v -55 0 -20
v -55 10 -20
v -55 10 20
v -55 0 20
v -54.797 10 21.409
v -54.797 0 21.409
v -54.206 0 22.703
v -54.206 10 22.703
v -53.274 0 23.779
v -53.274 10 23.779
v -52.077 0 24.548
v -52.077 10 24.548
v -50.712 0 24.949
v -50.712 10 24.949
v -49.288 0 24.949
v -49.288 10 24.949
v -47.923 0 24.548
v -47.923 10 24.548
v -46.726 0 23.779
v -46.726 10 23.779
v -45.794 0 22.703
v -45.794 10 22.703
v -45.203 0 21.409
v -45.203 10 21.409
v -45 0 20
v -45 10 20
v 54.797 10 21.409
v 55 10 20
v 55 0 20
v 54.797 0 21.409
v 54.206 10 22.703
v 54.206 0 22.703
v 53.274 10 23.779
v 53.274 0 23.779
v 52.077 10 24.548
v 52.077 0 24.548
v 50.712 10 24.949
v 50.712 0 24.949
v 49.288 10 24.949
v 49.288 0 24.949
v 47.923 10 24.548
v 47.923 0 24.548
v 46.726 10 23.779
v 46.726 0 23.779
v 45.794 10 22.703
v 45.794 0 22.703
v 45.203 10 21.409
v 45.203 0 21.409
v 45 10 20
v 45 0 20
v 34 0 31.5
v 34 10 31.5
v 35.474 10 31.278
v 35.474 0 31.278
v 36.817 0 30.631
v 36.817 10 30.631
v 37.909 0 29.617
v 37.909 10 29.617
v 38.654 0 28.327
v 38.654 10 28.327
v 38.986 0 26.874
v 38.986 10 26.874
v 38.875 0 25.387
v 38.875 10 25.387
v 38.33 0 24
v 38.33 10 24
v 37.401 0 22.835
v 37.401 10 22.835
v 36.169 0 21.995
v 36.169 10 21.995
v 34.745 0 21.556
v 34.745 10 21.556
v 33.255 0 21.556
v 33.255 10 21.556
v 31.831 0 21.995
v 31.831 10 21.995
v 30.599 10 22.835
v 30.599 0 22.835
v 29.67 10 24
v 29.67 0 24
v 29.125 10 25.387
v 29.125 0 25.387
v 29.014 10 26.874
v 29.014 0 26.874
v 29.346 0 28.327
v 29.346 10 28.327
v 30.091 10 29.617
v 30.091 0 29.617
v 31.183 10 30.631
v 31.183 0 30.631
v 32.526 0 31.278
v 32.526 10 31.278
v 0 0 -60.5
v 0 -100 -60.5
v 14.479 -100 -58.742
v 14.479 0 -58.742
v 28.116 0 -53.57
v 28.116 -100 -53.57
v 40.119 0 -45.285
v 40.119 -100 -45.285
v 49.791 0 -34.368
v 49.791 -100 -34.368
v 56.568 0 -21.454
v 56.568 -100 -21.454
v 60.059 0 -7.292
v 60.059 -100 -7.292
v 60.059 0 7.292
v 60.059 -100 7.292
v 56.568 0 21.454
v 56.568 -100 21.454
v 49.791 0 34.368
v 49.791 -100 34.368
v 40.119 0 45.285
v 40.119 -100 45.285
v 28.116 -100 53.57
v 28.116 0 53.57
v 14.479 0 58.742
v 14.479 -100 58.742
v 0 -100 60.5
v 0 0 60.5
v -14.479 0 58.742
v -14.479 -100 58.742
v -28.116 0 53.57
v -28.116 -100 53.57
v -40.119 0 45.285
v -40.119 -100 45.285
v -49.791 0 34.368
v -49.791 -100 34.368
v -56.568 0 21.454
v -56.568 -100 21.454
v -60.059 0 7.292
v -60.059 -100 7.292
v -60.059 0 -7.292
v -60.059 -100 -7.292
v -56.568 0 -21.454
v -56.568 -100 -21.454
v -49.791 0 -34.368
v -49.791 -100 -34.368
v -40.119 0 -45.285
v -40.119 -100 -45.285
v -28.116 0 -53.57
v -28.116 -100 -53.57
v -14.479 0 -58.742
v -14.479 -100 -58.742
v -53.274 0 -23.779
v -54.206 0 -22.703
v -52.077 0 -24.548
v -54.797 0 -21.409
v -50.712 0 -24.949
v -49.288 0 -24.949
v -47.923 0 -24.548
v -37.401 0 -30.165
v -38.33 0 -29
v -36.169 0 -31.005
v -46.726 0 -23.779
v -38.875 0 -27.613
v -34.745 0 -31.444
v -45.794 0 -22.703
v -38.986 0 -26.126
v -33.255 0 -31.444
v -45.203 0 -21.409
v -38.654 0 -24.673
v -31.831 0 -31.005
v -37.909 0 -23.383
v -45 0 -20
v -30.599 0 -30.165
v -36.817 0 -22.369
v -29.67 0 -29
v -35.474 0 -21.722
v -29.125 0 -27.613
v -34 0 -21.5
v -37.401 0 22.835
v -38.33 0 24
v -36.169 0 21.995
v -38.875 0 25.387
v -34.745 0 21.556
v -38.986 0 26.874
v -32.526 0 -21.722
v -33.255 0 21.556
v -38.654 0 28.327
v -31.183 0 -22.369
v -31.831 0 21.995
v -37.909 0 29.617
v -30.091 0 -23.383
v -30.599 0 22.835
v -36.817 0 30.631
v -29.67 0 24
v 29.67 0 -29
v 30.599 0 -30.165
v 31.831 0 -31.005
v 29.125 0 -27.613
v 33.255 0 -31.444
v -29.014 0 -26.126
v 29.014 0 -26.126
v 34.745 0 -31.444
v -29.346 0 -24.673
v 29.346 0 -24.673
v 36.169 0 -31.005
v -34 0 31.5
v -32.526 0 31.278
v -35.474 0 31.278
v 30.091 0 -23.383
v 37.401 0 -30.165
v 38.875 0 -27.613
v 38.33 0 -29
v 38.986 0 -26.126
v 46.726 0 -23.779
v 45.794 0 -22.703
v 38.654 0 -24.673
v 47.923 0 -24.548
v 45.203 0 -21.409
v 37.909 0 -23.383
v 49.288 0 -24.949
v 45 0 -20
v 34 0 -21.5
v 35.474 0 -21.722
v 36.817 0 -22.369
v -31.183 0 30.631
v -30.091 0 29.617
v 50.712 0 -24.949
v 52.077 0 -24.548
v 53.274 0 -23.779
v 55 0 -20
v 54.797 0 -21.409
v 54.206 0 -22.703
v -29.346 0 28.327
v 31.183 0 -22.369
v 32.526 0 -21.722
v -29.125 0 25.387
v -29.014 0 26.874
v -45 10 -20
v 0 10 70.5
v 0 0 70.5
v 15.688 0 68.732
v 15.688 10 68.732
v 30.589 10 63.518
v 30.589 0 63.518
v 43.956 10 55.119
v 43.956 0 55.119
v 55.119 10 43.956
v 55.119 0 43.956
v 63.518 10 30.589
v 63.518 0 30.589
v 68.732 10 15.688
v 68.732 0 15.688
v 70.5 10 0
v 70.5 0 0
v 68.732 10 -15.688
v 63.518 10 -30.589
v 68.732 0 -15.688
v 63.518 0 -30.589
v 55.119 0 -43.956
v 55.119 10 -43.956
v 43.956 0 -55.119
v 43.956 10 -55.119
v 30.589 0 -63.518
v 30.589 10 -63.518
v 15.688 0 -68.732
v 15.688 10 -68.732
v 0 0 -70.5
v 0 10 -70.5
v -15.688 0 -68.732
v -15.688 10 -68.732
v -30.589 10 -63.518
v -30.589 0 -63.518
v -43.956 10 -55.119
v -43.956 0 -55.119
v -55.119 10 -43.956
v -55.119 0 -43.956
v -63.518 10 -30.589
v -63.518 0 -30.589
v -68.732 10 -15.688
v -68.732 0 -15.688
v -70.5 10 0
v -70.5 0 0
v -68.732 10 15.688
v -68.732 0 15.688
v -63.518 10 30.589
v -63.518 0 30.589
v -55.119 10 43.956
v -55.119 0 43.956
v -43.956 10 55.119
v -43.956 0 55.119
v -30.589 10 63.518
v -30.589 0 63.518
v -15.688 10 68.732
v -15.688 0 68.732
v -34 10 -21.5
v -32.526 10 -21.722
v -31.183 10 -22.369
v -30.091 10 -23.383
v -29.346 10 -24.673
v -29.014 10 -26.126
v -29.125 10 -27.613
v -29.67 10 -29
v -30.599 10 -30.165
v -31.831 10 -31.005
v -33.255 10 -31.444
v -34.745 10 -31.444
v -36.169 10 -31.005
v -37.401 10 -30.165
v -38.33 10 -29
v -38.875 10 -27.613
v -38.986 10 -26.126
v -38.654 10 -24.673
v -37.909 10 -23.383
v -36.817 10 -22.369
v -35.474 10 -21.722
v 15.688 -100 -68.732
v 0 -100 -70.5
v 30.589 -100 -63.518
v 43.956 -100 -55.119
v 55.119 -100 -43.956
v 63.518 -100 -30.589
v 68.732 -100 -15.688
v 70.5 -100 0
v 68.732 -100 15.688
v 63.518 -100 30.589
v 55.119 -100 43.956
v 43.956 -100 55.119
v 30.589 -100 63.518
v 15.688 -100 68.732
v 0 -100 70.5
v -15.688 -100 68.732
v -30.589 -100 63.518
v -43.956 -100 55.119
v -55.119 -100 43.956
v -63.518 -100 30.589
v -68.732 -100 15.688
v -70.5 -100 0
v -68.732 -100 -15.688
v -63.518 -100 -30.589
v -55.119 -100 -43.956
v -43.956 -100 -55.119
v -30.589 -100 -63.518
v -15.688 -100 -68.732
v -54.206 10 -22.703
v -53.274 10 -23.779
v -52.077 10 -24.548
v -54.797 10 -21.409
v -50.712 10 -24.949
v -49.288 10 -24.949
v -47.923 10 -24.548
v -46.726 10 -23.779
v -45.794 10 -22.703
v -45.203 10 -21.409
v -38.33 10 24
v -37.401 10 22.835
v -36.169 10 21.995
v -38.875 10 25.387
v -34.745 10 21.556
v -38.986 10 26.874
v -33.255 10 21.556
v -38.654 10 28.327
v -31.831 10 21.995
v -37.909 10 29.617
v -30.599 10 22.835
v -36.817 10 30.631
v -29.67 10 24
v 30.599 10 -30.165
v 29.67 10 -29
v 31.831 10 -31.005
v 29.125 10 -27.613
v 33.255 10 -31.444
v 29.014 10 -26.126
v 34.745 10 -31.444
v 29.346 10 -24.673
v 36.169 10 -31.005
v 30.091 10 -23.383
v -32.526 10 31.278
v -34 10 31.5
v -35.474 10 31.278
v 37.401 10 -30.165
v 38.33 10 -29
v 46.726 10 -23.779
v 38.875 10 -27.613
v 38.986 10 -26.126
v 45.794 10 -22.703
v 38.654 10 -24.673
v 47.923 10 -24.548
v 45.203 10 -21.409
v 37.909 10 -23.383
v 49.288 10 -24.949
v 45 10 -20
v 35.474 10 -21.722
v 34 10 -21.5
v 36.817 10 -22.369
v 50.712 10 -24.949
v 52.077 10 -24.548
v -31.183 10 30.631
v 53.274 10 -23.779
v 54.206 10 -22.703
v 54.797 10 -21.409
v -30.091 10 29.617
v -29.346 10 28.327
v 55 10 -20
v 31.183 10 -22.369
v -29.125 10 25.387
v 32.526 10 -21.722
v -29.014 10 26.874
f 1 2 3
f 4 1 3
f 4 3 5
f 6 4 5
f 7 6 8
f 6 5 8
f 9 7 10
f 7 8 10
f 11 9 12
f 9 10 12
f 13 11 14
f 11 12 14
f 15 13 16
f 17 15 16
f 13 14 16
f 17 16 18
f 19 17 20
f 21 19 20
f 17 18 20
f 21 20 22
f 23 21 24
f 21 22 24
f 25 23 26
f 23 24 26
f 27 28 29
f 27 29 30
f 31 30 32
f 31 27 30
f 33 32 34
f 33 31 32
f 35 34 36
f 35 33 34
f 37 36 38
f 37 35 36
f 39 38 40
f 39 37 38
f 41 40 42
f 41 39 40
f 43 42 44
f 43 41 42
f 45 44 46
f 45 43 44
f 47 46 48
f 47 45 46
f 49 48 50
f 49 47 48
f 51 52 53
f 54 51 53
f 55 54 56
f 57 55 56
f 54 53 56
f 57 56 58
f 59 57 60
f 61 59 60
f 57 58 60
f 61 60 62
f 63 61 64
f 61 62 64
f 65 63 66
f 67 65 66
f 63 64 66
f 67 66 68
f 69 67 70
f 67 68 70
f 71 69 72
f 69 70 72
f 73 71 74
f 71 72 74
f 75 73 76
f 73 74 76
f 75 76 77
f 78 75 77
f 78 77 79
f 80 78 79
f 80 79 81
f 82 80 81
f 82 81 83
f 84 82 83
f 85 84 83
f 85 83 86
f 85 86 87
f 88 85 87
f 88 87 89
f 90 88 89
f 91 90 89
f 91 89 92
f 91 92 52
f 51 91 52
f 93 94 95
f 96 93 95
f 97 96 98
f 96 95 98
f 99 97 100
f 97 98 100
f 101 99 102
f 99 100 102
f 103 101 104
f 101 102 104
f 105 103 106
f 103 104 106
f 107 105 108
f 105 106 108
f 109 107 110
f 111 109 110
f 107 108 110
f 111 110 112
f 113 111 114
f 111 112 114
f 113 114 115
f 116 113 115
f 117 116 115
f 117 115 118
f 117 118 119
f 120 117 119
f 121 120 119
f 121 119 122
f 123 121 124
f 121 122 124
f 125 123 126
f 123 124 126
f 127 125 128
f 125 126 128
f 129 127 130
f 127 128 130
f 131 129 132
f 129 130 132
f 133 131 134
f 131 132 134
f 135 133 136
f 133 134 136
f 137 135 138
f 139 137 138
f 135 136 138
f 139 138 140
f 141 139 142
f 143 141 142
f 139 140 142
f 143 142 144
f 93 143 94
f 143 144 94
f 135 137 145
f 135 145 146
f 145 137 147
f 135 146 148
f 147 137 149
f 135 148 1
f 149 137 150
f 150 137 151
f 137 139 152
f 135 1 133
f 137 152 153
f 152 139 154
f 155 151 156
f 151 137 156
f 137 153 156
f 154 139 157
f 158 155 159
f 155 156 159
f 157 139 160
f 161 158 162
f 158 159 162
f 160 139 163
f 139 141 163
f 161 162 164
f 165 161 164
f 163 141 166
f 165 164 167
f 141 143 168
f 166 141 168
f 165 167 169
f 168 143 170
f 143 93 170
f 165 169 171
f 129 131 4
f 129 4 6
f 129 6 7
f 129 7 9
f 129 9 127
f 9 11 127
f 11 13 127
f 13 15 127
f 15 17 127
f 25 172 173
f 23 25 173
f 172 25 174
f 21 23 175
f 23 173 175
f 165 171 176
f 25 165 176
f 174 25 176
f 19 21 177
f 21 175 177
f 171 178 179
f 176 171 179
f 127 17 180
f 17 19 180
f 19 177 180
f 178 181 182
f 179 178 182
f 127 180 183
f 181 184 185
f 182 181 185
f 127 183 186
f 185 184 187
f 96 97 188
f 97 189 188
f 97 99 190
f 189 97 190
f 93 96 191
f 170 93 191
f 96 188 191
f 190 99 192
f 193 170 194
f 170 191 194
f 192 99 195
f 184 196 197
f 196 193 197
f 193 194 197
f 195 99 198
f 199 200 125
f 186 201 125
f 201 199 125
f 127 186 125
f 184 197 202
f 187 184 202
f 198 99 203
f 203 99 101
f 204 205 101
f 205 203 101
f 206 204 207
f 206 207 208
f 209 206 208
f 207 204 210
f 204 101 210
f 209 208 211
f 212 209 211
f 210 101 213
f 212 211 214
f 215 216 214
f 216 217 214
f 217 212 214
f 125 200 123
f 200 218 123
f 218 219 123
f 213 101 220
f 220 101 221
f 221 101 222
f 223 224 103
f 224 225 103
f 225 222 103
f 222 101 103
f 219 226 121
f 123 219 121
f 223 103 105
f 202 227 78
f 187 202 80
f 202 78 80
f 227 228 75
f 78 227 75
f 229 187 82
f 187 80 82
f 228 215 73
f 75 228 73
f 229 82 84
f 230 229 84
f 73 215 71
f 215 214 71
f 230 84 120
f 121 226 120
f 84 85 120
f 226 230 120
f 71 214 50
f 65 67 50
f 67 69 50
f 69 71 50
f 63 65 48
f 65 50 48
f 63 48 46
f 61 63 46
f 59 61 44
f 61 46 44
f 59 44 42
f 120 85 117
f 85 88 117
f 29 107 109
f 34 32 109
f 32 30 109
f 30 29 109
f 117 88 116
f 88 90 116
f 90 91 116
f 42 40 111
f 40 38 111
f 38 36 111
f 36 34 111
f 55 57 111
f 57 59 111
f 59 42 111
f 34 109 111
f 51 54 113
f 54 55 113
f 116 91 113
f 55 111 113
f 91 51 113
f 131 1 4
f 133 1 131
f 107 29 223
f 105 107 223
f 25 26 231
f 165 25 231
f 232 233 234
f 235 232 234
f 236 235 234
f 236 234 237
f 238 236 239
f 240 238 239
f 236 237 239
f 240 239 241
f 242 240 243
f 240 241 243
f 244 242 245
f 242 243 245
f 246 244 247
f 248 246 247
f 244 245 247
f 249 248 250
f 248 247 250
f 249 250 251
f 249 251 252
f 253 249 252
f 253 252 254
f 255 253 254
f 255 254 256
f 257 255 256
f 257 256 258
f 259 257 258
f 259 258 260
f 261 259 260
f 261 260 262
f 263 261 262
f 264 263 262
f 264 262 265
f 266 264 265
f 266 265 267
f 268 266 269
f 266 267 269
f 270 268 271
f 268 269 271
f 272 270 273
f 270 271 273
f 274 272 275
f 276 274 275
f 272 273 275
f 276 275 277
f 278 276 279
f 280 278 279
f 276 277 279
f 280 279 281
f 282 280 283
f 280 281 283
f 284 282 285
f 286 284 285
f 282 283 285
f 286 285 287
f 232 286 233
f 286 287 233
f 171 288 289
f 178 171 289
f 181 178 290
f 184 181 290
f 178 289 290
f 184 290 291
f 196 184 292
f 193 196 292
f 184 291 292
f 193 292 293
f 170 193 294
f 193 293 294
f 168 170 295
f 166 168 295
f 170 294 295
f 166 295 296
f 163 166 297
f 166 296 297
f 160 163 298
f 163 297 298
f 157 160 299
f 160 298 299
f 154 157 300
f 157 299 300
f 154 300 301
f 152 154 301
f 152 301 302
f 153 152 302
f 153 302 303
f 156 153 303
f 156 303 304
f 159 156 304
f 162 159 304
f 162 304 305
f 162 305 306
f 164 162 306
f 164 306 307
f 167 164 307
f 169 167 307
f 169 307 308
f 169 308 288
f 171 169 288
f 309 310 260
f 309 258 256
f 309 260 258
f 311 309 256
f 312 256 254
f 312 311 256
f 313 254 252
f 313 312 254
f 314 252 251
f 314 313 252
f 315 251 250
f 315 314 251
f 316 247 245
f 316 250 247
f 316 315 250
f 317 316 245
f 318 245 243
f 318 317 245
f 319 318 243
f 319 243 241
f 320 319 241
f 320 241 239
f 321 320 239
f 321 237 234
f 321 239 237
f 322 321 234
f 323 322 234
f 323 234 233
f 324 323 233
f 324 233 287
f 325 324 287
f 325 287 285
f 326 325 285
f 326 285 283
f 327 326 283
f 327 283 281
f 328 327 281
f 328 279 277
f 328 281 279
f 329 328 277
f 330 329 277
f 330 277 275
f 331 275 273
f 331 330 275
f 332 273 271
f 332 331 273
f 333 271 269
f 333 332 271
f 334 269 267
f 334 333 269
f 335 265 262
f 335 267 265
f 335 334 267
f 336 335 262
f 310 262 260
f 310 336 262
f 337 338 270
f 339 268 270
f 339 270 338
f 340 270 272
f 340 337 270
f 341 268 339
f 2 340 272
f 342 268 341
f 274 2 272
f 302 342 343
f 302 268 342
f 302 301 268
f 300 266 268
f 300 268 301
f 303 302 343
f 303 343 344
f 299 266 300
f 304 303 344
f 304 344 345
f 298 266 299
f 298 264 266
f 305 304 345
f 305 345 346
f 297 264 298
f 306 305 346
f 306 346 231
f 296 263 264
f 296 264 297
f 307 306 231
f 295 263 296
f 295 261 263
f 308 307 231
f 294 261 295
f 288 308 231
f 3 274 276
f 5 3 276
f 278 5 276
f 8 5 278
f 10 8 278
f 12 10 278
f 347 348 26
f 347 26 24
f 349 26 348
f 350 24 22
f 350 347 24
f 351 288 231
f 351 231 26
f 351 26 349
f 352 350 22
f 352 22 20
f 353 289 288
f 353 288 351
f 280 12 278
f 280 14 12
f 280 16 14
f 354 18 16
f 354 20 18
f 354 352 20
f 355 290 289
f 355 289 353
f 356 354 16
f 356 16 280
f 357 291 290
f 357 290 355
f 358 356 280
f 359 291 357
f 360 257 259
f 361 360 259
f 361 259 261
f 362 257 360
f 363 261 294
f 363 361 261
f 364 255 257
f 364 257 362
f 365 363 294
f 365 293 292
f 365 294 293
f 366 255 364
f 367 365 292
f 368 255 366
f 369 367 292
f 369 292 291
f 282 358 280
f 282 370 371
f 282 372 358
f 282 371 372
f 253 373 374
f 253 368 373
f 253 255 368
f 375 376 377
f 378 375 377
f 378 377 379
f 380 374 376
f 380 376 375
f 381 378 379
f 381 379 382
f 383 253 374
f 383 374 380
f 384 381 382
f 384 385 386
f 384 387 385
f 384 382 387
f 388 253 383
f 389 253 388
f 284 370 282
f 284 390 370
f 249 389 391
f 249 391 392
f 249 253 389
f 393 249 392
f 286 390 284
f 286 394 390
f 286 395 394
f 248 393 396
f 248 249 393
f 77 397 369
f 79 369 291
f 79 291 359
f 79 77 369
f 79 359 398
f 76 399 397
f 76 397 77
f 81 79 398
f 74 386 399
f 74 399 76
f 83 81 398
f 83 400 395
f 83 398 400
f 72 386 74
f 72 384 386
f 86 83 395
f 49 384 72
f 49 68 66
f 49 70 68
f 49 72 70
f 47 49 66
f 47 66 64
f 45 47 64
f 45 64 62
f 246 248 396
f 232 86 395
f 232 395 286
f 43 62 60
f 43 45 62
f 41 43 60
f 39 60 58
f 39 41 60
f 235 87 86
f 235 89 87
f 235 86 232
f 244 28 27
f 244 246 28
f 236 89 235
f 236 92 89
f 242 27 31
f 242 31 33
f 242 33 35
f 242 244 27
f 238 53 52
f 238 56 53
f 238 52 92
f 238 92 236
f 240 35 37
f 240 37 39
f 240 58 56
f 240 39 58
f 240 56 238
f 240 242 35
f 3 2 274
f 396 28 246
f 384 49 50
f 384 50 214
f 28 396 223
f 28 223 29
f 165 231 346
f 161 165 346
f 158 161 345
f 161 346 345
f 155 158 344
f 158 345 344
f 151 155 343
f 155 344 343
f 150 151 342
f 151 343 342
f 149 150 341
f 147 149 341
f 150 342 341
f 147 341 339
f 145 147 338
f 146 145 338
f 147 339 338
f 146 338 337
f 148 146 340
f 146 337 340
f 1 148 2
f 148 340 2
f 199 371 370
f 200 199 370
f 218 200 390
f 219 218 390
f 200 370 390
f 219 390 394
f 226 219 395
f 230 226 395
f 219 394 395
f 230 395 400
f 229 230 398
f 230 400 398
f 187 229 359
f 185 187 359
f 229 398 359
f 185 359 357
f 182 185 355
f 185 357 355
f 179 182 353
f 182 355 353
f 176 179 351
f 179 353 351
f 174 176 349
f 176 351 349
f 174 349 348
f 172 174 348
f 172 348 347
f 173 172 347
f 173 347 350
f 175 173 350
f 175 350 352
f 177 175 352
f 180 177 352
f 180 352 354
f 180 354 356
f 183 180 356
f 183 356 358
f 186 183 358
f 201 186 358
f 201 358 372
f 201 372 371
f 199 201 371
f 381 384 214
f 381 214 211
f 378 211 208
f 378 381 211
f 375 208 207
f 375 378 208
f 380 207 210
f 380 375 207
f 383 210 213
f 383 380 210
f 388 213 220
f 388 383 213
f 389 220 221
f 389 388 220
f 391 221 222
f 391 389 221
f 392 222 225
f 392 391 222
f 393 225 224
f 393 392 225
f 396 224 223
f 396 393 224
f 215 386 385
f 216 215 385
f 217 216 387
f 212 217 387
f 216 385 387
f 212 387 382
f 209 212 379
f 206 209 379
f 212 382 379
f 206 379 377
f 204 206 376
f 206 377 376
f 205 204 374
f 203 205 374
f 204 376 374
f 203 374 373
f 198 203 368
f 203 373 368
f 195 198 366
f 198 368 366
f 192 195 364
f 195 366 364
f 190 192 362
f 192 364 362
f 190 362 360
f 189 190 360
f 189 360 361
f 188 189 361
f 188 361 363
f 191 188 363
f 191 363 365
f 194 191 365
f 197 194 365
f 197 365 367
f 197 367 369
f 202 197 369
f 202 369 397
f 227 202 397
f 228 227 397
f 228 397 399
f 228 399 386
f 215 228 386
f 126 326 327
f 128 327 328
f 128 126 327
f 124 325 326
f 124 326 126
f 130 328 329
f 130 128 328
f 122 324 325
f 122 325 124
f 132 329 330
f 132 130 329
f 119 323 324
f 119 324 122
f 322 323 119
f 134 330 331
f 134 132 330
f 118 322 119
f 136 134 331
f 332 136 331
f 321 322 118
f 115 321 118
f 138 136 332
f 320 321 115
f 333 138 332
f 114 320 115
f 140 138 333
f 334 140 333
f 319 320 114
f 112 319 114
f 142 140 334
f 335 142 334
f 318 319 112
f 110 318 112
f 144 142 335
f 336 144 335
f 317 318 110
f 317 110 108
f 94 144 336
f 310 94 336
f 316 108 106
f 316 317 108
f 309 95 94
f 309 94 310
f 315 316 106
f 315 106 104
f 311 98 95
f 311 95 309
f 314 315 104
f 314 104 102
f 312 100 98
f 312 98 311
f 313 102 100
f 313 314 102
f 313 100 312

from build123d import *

# Parameters (mm, degrees)
SKETCH1_R           = 70.5
BOSS_EXTRUDE1_DEPTH = 10
SKETCH2_R           = 5
CUT_EXTRUDE1_DEPTH  = 101.202295383
BOSS_EXTRUDE2_START = 100
SKETCH3_R           = 70.5
SKETCH3_R_2         = 60.5
BOSS_EXTRUDE2_DEPTH = 100
CUT_EXTRUDE2_DEPTH  = 149.460432439


with BuildPart() as part:
    # Sketch1 → Boss-Extrude1 (new body)
    with BuildSketch(Plane(origin=(0, 0, 0), x_dir=(1, 0, 0), z_dir=(0, 1, 0))):
        with Locations(Location((0, 0, 0), (0, 0, 270))):
            Circle(SKETCH1_R)
    extrude(amount=BOSS_EXTRUDE1_DEPTH)

    # Sketch2 → Cut-Extrude1 (cut, through all)
    with BuildSketch(Plane(origin=(0, 10, 0), x_dir=(1, 0, 0), z_dir=(0, 1, 0))):
        with Locations(Location((-34, -26.5, 0), (0, 0, 270))):
            Circle(SKETCH2_R)
        with Locations(Location((34, -26.5, 0), (0, 0, 270))):
            Circle(SKETCH2_R)
        with Locations(Location((34, 26.5, 0), (0, 0, 270))):
            Circle(SKETCH2_R)
        with Locations(Location((-34, 26.5, 0), (0, 0, 270))):
            Circle(SKETCH2_R)
    extrude(amount=-CUT_EXTRUDE1_DEPTH, mode=Mode.SUBTRACT)

    # Sketch3 → Boss-Extrude2 (add)
    with BuildSketch(Plane.XZ.offset(BOSS_EXTRUDE2_START)):
        with Locations(Location((0, 0, 0), (0, 0, 270))):
            Circle(SKETCH3_R)
        with Locations(Location((0, 0, 0), (0, 0, 270))):
            Circle(SKETCH3_R_2, mode=Mode.SUBTRACT)
    extrude(amount=-BOSS_EXTRUDE2_DEPTH)

    # Sketch4 → Cut-Extrude2 (cut, through all)
    with BuildSketch(Plane(origin=(0, 10, 0), x_dir=(1, 0, 0), z_dir=(0, 1, 0))):
        with BuildLine():
            Line((55, 20), (55, -20))
            ThreePointArc((55, -20), (50, -25), (45, -20))
            Line((45, -20), (45, 20))
            ThreePointArc((45, 20), (50, 25), (55, 20))
        make_face()
    cut_extrude2 = extrude(amount=-CUT_EXTRUDE2_DEPTH, mode=Mode.SUBTRACT)

    # Mirror1: Cut-Extrude2 across plane
    add(cut_extrude2.mirror(Plane(origin=(0, 0, 0), x_dir=(0, 0, 1), z_dir=(1, 0, 0))), mode=Mode.SUBTRACT)


solid = part.part
